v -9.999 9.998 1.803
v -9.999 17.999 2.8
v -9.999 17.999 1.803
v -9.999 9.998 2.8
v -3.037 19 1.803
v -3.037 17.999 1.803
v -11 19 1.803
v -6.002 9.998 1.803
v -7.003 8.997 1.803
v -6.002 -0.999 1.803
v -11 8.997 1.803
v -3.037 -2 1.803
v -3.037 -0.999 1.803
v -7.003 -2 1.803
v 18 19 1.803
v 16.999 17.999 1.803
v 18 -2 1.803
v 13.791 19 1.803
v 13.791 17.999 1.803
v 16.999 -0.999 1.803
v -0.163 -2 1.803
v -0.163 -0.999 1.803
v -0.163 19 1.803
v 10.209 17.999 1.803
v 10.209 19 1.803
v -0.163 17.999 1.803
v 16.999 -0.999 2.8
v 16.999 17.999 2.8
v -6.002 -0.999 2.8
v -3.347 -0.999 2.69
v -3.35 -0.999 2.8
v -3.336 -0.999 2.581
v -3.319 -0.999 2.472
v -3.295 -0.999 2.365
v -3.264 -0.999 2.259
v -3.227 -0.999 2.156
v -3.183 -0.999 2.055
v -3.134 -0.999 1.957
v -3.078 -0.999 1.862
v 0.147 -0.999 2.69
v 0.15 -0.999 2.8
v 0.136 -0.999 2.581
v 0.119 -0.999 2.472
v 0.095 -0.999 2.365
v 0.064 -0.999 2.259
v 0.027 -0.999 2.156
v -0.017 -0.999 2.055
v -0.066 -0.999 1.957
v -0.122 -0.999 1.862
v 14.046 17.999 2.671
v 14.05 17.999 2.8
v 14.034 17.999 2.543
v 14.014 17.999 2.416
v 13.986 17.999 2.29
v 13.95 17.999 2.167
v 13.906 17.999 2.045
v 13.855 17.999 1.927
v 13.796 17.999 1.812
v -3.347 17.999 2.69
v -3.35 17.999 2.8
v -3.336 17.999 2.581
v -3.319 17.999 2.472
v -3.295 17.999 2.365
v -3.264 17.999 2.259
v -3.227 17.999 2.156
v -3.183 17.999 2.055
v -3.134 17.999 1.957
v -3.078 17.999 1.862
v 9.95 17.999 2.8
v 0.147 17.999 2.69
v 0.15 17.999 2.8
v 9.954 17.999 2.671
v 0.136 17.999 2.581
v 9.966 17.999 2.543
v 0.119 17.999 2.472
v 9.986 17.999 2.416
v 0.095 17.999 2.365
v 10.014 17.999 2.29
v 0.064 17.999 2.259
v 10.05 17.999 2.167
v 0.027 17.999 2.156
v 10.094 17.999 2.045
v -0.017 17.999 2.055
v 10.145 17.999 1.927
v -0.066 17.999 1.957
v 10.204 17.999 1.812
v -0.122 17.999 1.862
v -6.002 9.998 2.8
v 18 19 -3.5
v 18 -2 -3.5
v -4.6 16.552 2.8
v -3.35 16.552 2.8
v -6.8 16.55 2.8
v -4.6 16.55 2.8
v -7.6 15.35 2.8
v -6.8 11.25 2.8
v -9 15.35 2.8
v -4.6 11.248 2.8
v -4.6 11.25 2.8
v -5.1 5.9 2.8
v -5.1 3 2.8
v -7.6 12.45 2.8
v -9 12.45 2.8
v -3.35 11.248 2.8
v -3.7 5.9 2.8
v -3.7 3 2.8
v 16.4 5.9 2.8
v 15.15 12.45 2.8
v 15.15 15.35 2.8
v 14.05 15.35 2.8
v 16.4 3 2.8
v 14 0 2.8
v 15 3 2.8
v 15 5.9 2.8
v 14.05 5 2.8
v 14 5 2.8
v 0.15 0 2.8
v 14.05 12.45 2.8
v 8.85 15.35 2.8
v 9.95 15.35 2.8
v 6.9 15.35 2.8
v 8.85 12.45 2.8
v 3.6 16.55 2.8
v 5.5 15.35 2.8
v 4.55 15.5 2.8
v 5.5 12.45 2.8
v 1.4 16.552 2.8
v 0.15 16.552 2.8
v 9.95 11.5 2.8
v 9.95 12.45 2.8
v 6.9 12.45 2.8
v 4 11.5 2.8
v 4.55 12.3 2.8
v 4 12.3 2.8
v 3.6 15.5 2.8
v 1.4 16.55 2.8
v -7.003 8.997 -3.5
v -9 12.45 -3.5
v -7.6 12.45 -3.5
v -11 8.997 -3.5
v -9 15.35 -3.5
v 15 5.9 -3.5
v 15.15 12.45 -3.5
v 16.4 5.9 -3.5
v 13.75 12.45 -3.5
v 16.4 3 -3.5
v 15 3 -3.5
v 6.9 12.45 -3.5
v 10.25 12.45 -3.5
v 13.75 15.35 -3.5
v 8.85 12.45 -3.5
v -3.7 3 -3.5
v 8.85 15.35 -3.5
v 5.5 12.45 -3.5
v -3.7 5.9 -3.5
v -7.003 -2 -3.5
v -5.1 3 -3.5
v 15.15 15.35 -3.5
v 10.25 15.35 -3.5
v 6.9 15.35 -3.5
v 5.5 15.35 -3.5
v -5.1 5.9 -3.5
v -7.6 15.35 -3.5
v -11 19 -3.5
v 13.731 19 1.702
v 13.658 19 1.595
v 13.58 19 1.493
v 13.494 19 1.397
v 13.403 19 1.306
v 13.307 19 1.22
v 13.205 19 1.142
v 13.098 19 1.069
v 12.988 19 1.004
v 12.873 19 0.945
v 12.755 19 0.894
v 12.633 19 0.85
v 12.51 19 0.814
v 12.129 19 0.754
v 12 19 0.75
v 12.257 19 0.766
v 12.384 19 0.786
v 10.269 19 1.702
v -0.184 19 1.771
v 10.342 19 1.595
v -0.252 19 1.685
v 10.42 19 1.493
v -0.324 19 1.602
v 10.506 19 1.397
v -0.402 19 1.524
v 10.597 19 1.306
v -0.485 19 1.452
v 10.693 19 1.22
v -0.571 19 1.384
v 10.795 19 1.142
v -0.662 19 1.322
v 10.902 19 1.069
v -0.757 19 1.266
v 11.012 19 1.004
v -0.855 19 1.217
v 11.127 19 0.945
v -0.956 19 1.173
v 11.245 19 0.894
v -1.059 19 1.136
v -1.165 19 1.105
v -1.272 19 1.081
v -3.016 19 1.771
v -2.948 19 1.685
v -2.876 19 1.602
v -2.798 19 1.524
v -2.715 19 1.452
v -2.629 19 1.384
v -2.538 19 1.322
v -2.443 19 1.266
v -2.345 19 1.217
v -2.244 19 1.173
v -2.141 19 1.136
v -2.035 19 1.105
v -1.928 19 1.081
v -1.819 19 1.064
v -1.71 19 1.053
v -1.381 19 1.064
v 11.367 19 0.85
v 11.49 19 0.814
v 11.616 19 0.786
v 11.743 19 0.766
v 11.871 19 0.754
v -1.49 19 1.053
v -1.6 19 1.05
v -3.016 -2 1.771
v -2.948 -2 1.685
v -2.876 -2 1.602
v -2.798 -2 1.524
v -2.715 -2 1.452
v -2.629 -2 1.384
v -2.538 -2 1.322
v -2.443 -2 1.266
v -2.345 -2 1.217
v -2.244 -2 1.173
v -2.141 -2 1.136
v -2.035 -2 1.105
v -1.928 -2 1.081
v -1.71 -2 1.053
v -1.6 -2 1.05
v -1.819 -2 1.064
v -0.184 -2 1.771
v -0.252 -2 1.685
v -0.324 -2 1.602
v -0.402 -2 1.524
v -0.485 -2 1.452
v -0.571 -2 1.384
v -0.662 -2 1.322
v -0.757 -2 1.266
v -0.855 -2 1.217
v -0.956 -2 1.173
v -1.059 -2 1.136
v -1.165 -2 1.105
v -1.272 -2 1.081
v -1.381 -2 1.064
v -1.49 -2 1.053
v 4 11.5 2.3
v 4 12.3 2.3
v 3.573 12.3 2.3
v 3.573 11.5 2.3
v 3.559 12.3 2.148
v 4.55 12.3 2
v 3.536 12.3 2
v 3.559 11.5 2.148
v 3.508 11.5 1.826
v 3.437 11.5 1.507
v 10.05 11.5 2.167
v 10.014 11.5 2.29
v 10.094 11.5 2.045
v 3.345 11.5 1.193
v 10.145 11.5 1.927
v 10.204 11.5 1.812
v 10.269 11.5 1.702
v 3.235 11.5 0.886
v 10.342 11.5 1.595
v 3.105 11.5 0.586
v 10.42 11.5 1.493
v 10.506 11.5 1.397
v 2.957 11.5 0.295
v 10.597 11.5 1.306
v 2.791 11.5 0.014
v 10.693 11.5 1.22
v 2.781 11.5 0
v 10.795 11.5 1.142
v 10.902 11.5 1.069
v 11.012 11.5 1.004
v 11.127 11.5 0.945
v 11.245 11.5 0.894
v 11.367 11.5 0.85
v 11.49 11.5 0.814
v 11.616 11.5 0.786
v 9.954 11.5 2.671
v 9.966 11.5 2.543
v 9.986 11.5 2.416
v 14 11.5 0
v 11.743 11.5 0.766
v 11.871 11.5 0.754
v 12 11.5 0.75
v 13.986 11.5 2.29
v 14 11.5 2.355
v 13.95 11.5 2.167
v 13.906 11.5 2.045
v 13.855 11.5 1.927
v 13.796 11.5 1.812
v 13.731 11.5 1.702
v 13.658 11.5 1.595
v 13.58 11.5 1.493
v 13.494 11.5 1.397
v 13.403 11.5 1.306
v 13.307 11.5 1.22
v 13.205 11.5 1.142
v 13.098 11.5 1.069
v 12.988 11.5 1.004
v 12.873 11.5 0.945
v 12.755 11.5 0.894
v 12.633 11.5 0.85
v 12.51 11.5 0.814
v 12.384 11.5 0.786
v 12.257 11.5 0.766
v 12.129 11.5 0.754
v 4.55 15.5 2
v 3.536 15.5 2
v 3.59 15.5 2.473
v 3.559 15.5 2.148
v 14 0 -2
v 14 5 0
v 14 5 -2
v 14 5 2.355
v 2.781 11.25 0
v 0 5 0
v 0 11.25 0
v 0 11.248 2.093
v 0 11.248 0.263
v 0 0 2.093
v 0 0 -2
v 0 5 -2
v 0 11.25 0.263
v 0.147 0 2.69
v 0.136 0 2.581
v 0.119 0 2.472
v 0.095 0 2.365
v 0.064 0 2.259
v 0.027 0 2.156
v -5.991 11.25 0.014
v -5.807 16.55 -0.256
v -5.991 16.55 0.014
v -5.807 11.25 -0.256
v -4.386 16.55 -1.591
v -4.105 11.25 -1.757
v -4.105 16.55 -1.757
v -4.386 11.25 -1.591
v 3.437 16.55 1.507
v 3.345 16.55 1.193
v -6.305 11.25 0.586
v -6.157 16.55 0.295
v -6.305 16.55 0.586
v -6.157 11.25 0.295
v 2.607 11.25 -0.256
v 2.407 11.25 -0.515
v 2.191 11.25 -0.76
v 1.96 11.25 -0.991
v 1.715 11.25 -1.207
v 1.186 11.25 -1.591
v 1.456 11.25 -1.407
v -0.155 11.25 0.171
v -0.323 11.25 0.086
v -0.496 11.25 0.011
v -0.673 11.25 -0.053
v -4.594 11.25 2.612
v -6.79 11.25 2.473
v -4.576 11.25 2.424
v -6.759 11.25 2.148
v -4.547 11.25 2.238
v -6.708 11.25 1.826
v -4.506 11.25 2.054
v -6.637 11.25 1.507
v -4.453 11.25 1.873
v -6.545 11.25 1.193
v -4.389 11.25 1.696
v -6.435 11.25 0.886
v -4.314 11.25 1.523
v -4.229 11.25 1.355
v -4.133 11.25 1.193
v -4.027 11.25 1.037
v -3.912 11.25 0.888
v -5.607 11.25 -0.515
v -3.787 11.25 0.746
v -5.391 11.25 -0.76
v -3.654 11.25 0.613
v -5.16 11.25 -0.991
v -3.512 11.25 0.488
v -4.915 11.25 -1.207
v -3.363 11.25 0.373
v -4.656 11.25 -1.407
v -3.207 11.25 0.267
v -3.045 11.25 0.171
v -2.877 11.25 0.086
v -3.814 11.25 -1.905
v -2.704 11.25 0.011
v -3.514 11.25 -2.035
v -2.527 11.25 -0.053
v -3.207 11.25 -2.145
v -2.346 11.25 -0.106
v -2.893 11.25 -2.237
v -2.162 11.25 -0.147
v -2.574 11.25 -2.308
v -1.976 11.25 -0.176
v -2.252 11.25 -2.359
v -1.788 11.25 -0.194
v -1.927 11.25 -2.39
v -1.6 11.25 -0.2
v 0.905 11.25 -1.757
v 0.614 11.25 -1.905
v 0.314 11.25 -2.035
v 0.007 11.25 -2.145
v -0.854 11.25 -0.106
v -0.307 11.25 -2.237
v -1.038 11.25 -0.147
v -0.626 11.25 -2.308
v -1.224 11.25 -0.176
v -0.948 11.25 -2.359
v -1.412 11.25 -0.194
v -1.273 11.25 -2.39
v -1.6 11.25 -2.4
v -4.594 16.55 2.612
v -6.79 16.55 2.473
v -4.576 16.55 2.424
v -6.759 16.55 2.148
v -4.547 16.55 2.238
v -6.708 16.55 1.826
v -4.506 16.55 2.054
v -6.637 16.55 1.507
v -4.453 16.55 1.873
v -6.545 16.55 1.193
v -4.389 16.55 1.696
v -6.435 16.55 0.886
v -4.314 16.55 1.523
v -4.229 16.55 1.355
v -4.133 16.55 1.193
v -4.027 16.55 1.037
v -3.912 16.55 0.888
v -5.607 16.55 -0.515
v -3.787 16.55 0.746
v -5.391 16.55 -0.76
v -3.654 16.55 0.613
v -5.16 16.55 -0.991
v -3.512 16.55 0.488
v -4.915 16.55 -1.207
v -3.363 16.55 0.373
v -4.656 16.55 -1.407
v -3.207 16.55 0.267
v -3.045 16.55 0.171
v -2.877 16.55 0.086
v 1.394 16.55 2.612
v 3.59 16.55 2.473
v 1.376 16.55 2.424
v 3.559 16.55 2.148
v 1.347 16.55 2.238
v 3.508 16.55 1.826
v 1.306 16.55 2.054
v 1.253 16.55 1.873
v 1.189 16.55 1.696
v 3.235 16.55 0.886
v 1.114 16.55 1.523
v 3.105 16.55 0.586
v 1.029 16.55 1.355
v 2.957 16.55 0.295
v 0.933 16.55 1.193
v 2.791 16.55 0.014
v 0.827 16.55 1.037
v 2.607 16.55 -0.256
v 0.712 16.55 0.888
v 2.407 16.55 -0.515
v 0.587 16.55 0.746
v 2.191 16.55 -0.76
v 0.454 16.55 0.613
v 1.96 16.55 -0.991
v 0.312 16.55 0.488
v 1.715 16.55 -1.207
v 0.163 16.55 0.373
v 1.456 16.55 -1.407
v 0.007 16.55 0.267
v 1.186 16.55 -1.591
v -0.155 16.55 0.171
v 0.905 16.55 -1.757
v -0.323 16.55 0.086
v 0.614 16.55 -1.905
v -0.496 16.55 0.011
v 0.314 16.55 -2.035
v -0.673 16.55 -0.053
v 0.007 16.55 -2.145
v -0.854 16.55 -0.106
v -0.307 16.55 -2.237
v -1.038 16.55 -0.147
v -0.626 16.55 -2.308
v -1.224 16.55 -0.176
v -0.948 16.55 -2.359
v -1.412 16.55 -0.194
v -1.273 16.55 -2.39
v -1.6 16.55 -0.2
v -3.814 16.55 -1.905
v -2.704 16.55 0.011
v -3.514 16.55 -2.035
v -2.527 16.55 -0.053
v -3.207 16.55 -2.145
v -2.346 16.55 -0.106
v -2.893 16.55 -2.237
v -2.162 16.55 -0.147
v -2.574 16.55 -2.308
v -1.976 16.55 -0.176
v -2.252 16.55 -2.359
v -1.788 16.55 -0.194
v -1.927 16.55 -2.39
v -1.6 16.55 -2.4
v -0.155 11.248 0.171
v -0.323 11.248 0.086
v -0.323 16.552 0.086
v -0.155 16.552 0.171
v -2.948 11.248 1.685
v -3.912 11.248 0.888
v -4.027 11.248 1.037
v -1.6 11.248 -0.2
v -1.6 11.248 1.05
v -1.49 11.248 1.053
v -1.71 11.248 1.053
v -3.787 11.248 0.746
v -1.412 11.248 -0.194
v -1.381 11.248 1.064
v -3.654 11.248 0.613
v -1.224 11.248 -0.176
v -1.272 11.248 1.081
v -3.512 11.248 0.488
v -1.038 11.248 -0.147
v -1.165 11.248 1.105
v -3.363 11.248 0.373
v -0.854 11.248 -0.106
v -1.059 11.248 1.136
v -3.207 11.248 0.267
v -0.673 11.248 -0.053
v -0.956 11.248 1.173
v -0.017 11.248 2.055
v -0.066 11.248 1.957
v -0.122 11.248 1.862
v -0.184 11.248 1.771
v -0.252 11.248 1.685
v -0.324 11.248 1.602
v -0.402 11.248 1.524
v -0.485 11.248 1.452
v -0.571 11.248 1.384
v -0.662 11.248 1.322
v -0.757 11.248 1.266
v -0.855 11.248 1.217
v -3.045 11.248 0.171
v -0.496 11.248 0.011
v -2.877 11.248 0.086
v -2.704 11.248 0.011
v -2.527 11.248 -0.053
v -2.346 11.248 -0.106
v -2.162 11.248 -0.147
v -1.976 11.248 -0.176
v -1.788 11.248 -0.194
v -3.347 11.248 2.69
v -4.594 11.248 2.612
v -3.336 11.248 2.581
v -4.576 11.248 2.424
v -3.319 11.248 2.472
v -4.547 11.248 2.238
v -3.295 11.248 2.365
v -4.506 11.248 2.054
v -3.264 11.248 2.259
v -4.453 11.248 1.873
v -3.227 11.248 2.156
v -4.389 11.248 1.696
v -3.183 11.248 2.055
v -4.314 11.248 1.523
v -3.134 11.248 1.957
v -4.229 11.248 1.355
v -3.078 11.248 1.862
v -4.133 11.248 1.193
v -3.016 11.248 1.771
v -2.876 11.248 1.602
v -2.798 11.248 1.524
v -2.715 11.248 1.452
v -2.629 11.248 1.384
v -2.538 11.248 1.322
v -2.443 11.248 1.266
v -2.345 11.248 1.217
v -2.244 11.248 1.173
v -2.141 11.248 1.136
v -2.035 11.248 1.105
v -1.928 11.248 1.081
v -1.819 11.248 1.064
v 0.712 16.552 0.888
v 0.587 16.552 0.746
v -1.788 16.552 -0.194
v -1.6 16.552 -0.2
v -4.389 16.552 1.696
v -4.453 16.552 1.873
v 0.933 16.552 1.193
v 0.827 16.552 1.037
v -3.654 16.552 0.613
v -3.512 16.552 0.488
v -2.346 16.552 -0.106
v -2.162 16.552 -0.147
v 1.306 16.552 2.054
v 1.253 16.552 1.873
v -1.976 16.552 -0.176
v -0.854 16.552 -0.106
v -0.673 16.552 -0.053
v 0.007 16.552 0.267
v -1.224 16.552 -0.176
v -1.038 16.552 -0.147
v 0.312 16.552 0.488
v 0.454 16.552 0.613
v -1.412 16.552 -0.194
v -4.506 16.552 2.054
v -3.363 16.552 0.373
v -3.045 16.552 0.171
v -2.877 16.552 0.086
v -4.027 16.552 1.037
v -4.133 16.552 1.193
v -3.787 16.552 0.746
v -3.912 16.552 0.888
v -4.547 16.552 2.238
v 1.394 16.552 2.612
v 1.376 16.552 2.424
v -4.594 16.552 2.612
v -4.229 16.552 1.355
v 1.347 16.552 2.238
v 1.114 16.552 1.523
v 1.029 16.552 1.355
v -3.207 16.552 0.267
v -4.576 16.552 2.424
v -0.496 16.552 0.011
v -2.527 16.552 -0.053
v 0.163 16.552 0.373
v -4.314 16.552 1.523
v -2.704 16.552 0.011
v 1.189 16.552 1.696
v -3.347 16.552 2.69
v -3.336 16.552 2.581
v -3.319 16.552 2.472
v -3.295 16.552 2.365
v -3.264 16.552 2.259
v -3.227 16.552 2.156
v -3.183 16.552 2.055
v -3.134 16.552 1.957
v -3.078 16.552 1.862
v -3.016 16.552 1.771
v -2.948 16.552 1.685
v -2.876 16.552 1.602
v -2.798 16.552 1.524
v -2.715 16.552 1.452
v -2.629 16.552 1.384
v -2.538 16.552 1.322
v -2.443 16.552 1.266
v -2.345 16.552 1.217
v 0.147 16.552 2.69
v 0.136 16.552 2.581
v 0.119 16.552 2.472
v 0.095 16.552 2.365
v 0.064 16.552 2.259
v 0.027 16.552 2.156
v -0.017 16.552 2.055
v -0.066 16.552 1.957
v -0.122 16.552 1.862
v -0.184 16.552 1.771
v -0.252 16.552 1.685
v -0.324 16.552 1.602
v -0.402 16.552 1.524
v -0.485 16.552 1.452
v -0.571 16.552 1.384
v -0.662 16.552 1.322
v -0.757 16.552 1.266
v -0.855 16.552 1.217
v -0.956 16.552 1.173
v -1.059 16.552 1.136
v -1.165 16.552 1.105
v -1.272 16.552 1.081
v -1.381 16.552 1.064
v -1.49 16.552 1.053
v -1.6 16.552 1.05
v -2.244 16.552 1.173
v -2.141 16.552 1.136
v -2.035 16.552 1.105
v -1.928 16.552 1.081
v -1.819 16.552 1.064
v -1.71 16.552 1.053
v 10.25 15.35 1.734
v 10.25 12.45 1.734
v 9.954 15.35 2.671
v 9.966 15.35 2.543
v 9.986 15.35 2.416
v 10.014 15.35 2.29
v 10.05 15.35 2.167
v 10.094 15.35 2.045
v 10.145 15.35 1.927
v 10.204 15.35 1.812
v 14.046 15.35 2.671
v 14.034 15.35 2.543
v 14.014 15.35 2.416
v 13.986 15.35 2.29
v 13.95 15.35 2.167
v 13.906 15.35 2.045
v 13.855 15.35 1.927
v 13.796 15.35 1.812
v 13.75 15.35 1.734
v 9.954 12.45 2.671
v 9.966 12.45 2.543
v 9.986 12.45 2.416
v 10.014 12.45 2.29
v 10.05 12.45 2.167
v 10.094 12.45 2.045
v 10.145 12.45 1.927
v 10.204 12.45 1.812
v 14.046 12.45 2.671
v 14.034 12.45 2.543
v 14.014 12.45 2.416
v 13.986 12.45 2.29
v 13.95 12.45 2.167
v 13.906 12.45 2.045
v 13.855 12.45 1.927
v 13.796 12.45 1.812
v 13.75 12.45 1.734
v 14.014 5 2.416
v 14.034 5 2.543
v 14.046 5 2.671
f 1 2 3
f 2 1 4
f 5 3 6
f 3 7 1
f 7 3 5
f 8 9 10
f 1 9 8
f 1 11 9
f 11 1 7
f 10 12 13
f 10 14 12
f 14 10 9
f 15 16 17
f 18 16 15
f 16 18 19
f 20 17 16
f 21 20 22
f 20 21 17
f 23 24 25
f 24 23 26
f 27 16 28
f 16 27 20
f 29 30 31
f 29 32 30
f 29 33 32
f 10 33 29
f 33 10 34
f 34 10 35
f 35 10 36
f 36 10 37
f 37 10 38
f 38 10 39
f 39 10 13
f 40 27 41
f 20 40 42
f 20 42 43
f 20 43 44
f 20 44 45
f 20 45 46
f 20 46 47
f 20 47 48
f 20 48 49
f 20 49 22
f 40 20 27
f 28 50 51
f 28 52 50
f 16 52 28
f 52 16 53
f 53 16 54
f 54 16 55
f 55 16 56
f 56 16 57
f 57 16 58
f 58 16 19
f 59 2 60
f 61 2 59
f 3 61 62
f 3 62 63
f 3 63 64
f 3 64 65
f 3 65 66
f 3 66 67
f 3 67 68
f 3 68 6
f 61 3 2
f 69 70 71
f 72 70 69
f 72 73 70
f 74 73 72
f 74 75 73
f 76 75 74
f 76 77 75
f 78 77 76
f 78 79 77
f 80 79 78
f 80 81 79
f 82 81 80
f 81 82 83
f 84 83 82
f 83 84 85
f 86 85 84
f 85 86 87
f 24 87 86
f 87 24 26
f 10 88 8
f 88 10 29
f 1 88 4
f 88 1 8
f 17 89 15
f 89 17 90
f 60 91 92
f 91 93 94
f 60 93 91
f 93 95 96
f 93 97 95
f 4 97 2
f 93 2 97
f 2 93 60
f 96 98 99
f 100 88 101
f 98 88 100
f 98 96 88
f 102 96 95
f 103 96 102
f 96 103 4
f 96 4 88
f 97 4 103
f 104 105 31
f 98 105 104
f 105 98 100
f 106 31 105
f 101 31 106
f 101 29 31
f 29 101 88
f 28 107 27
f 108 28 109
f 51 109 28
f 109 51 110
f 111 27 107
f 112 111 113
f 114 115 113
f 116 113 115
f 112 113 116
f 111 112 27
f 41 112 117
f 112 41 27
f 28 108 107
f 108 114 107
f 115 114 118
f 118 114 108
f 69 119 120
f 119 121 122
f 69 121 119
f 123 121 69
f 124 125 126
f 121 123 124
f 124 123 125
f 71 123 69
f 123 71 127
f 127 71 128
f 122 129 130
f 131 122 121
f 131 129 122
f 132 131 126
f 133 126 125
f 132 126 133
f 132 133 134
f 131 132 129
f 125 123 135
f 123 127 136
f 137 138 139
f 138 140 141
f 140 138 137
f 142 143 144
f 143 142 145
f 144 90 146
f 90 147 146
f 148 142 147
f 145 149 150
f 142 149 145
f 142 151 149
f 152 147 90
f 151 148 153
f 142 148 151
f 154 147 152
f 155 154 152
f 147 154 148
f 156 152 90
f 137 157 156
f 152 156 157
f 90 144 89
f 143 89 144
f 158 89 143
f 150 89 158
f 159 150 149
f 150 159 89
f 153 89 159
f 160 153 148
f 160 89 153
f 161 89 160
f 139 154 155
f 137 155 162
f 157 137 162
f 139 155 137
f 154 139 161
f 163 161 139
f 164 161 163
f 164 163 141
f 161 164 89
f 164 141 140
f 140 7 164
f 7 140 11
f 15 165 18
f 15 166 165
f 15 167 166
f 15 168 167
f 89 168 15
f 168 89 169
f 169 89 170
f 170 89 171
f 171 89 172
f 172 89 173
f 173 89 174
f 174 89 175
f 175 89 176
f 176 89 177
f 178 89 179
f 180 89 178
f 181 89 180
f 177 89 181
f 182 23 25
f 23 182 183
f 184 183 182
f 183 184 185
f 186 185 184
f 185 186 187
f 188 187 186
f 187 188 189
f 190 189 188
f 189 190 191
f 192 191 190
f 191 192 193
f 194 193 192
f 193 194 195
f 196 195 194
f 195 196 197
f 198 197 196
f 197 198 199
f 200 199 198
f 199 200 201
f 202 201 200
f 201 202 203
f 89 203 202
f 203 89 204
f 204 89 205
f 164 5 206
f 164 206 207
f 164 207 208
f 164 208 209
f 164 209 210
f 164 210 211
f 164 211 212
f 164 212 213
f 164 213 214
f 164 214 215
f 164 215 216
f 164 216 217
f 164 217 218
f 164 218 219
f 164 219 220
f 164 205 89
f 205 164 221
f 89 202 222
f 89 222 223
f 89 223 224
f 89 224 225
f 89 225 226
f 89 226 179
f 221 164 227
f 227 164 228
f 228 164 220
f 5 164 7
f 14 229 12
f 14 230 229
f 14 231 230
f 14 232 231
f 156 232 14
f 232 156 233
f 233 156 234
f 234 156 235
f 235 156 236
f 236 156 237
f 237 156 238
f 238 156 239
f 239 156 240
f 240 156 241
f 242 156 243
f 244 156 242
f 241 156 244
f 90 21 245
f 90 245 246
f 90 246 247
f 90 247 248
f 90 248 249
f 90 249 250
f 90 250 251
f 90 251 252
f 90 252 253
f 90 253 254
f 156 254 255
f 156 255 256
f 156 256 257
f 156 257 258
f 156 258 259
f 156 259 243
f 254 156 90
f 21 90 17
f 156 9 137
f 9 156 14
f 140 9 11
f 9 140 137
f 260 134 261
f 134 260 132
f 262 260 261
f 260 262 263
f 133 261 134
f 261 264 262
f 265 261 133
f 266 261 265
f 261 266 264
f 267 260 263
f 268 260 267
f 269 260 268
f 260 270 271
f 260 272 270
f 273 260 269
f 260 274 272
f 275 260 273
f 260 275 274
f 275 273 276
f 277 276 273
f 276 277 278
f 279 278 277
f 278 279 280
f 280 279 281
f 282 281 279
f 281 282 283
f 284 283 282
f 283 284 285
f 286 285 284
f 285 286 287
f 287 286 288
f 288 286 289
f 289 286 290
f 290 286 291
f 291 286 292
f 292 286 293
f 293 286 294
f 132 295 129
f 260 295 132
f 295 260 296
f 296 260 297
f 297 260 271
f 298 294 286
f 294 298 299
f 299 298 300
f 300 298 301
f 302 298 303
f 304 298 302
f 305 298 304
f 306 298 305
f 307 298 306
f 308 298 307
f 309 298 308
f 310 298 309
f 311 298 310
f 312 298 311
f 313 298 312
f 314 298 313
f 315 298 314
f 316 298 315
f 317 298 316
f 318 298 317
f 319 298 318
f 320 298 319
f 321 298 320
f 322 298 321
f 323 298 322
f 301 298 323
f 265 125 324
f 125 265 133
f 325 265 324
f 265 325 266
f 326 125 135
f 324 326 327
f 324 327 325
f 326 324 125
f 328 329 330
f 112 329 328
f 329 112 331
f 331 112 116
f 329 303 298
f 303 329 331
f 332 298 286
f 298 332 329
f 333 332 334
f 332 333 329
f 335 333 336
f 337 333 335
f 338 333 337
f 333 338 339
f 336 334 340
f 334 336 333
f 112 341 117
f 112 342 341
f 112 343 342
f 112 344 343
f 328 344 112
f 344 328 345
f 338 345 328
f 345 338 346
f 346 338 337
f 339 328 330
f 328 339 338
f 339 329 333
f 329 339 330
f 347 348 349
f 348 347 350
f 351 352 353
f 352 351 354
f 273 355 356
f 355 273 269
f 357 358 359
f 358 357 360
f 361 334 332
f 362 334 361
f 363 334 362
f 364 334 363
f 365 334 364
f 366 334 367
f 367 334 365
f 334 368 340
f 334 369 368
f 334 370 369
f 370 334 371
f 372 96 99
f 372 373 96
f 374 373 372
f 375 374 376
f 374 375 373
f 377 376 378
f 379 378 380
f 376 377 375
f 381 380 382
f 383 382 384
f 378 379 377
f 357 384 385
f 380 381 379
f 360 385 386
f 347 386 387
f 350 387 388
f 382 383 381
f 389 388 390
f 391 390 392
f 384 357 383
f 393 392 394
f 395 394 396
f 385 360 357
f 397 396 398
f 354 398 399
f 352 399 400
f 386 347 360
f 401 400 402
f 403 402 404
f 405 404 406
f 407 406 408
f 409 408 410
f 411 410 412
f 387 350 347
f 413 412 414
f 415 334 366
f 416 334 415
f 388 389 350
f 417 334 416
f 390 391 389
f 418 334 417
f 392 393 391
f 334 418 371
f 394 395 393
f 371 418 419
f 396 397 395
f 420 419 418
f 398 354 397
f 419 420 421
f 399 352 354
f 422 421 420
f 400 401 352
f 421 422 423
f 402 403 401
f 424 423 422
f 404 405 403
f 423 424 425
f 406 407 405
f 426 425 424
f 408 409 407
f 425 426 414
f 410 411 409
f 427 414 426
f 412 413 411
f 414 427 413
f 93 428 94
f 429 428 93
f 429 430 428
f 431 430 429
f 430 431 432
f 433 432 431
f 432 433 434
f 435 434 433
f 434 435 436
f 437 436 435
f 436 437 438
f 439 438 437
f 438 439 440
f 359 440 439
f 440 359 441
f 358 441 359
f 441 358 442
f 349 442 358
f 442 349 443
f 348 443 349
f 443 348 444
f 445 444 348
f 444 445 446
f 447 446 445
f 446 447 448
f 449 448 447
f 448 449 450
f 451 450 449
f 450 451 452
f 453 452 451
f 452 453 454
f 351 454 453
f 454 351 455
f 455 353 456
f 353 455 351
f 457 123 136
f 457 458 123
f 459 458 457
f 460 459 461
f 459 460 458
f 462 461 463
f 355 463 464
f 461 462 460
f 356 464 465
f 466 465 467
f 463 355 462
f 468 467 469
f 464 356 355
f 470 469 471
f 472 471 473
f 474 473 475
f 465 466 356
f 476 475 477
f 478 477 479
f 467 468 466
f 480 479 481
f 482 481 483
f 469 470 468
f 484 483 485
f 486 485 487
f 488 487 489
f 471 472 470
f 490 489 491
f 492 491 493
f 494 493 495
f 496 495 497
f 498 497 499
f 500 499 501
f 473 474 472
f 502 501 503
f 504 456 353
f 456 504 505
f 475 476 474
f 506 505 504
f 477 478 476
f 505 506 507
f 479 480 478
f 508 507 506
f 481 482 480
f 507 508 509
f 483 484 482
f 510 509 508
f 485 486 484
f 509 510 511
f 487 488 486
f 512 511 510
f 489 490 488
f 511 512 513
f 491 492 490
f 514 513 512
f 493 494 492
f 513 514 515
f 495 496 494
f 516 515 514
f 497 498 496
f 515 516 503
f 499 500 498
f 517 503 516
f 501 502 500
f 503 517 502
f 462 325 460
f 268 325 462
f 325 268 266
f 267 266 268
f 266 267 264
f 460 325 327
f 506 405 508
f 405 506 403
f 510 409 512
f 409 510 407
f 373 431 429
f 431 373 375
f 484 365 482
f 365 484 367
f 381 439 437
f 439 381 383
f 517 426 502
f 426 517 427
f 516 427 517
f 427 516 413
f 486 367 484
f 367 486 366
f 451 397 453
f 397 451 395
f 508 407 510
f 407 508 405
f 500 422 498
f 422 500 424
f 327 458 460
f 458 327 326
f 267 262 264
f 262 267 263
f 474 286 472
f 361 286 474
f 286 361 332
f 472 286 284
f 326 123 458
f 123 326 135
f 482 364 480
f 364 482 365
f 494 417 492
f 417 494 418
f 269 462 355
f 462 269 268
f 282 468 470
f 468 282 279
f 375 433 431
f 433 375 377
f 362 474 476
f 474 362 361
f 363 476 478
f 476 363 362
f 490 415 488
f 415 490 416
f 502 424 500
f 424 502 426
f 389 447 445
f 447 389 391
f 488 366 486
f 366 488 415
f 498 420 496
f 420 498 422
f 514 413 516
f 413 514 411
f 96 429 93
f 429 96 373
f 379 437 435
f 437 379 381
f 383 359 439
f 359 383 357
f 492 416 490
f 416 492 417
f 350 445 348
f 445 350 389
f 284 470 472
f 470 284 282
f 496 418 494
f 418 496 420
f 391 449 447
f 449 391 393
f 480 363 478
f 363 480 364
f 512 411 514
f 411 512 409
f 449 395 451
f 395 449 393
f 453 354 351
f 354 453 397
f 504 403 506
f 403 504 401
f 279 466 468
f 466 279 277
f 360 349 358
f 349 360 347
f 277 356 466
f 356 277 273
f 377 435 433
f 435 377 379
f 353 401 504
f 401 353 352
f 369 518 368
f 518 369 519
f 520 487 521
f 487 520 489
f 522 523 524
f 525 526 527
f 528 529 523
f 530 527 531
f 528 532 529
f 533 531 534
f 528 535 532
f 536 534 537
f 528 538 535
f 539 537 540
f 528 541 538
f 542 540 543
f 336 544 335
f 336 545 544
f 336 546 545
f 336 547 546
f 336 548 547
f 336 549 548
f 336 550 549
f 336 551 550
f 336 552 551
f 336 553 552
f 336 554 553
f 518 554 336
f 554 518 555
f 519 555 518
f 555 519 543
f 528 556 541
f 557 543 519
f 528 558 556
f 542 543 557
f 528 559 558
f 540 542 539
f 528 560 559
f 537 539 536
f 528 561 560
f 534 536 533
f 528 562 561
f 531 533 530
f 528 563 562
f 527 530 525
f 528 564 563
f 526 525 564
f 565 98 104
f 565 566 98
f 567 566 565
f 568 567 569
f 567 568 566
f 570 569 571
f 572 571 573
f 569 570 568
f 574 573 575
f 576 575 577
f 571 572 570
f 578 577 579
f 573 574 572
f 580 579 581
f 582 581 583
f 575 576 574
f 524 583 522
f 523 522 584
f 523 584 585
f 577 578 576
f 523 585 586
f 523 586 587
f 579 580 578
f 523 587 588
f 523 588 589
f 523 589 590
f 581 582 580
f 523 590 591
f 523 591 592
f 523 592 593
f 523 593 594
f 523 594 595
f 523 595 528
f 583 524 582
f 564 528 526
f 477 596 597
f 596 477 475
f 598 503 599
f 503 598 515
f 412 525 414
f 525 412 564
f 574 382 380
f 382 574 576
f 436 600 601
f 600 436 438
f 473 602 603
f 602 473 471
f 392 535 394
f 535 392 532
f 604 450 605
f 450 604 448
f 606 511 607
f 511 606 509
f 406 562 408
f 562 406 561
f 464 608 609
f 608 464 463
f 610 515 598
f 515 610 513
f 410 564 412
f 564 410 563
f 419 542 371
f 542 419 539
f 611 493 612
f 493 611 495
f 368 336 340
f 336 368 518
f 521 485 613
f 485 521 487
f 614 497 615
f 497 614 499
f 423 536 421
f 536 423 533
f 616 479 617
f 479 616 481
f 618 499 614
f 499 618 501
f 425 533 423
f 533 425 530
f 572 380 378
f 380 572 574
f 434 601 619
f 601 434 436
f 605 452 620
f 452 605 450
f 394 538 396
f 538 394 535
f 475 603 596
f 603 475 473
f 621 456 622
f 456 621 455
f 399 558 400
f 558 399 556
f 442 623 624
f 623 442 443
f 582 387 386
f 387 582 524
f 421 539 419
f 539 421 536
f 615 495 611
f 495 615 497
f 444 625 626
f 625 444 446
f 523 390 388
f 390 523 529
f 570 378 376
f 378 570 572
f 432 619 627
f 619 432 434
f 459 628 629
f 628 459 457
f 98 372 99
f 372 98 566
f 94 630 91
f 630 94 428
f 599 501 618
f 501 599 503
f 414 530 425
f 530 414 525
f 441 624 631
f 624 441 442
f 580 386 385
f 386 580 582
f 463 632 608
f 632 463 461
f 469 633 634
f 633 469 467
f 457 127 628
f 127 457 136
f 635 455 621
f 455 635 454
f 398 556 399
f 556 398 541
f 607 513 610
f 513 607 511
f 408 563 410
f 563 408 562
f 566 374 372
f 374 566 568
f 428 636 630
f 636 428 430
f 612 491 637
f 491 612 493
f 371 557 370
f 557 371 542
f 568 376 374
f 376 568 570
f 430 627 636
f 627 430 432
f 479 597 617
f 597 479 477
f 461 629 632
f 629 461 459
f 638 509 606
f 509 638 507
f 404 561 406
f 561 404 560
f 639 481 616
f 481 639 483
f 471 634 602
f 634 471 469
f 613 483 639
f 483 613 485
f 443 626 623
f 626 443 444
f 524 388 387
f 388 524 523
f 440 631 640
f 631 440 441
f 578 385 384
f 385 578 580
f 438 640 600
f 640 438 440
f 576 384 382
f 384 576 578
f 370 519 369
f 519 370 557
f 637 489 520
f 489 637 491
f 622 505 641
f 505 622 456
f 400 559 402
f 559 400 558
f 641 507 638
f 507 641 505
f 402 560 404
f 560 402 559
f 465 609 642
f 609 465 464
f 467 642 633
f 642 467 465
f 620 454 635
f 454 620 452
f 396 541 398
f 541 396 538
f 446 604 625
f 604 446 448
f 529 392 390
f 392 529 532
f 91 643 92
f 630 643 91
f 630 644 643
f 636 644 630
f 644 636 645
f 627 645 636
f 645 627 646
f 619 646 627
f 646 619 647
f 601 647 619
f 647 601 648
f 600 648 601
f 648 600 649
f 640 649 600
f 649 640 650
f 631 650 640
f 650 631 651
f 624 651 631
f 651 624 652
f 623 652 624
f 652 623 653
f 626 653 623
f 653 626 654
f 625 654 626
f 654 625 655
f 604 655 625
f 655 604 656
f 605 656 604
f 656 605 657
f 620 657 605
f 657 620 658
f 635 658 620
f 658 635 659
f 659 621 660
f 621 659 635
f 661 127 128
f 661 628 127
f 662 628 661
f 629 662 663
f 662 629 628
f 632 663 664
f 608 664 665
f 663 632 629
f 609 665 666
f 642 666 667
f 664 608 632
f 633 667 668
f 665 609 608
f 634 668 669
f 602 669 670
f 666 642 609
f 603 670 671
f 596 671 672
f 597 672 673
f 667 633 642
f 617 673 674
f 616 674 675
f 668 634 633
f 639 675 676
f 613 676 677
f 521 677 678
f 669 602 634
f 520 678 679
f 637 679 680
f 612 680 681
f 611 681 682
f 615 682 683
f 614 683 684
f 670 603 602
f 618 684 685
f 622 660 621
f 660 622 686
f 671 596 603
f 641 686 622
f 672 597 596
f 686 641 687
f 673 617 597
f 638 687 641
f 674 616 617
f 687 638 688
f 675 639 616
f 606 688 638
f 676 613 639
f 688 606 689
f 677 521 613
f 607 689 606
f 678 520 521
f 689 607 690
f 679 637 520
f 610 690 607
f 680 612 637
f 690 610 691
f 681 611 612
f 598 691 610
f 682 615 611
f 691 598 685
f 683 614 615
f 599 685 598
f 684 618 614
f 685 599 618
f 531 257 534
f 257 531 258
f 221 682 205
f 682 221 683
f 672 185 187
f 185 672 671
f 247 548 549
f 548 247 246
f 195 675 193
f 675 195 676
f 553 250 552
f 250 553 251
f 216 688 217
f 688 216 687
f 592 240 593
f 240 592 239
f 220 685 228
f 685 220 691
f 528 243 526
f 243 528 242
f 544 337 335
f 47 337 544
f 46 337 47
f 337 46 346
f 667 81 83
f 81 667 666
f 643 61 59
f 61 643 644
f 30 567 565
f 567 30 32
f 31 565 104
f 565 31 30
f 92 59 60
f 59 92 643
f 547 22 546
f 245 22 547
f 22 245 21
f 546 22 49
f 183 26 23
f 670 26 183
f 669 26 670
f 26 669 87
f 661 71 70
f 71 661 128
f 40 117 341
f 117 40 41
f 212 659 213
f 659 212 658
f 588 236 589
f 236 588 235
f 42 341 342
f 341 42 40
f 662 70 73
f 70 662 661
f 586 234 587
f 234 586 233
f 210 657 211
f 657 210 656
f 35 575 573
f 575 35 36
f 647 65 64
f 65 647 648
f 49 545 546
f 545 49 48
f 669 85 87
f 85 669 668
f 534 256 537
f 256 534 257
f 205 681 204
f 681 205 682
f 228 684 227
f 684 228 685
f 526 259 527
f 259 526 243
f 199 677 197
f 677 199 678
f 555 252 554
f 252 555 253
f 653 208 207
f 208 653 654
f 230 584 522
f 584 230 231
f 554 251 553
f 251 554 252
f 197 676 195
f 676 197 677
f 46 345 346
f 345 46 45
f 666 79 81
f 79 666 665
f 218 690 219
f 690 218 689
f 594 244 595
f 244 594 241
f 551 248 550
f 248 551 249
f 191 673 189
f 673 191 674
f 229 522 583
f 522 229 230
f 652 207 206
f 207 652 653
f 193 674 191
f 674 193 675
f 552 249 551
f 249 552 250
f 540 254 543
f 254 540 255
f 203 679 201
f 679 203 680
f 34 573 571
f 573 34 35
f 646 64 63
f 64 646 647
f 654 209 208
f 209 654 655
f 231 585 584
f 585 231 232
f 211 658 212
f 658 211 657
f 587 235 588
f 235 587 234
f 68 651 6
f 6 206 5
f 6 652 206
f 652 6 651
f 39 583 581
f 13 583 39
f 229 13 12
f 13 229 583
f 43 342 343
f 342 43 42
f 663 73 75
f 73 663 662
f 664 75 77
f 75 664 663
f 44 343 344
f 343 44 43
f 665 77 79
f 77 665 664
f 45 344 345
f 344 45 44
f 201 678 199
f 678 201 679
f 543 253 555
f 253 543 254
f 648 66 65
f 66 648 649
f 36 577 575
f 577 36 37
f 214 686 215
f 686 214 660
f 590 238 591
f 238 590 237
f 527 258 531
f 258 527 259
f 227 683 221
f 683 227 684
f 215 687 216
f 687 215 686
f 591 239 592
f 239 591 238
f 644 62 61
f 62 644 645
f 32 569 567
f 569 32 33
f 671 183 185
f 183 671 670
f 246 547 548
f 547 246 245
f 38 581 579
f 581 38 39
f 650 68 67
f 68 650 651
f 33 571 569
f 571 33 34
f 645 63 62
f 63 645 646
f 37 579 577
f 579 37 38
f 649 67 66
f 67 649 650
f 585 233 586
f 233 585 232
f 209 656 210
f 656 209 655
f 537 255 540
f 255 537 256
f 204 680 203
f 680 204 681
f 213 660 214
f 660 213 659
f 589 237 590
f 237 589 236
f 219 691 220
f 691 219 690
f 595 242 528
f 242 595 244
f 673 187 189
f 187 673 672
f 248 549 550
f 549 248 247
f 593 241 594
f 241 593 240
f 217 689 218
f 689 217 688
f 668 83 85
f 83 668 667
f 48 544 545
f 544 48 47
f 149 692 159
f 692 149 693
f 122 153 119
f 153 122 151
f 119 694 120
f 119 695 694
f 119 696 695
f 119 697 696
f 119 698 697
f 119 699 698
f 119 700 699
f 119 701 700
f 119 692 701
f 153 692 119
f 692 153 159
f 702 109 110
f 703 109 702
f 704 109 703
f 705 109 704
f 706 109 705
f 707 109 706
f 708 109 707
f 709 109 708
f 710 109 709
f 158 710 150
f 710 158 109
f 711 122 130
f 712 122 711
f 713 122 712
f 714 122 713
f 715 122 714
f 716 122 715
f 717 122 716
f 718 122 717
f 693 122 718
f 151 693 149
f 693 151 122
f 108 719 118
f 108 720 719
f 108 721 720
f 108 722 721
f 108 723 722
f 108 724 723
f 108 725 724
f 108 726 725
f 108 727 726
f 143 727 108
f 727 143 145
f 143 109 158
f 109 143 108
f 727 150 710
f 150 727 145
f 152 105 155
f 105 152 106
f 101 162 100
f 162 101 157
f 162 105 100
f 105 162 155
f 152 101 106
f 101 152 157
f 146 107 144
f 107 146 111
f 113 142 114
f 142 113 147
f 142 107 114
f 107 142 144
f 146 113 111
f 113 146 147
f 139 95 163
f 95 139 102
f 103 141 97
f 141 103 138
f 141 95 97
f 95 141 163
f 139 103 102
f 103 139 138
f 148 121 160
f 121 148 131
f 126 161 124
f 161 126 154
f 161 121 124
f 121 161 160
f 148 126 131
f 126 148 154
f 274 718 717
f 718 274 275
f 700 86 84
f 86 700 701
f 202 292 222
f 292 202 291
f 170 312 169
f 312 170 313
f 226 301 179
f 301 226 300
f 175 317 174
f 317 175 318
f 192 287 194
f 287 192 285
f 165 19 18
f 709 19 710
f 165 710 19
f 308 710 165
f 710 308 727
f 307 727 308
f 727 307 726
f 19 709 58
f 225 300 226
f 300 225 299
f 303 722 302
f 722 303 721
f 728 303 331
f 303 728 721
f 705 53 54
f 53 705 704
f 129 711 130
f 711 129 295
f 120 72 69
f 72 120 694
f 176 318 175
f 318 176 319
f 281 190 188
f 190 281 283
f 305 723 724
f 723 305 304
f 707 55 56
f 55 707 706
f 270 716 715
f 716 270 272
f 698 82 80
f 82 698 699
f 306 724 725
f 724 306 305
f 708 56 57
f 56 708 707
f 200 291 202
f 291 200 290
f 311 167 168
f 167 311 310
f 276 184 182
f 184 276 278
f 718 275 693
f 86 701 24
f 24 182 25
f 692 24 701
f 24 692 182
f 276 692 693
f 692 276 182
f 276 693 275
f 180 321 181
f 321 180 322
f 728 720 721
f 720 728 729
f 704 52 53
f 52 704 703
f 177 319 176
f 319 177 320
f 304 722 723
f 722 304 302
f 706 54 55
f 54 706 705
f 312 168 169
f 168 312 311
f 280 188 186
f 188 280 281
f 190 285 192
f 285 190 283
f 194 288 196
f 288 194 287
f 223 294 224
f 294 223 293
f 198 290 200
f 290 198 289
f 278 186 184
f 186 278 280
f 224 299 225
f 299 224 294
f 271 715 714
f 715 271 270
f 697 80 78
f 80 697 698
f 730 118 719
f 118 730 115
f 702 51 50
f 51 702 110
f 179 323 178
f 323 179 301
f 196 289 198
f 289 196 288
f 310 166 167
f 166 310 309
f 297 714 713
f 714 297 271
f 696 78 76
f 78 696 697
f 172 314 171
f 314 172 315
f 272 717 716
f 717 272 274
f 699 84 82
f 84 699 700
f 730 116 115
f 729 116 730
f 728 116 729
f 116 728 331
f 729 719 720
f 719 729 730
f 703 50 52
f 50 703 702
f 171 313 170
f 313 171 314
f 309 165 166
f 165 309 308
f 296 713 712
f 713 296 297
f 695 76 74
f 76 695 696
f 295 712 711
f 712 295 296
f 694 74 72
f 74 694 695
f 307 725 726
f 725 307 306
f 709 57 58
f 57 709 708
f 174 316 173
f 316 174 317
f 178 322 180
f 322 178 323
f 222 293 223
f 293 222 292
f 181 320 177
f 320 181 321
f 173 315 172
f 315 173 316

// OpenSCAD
$fn=100;

epsilon = 0.003;

//TODO: Check params
power_cable_dia = 3.5;
ferrite_outer_dia = 10.4;
ferrite_depth = 5.3;
ferrite_width = 2.2;

pcb_size = [14, 11.5, 5];
pcb_cable_guide_width = 5;
pcb_cable_guide_extra_height = 4;
sensor_left_offset = 1;
sensor_height_offset = 2.3;
sensor_pin_size = [3, 0.8, 0.5];
sensor_head_size = [4.1, 3.2, 1.6];
sensor_head_z_pos = -0.3;

data_cable_dia = 4.1;
data_cable_x = 12;
data_cable_y = 5;
data_cable_zip_dist = -0.3;

base_sx = 21;
base_sy = 17;

base_border = [4, 2, 3.5];
base_edge_width = 1;
base_edge_heigth = 1;
base_cutout_x = 4;
base_cutout_y = 11;

top_thickness = 6;

zip_size = [1.4, 2.9];

// Derived parameters
pcb_to_sensor_center = [0, pcb_size[1], 0] + [sensor_left_offset + sensor_pin_size[0] / 2, sensor_pin_size[1], sensor_height_offset + sensor_head_z_pos] + [0, sensor_head_size[1] / 2, sensor_head_size[2] / 2];

ferrite_center = pcb_to_sensor_center - [ferrite_outer_dia / 2 - ferrite_width / 2, 0, 0];

base_size = [base_sx + base_border[0] * 2, base_sy + base_border[1] * 2, base_border[2] + ferrite_center[2]];

module ferrite()
{
    //difference()
    {
        cylinder(h = ferrite_depth, r = ferrite_outer_dia / 2, center = true);
        cylinder(h = ferrite_depth + epsilon, r = ferrite_outer_dia / 2 - ferrite_width, center = true);
    }
}

module power_cable()
{
    cylinder(h = 100, r = power_cable_dia / 2, center = true);
}

module pcb()
{
    
    cube(pcb_size);
    
    translate([0, 0, -pcb_cable_guide_extra_height / 2])
        cube([pcb_size[0], pcb_cable_guide_width, pcb_size[2] + pcb_cable_guide_extra_height]);
    translate([sensor_left_offset, pcb_size[1], sensor_height_offset])
    {
        cube(sensor_pin_size);
        translate([(sensor_pin_size[0] - sensor_head_size[0]) / 2, sensor_pin_size[1], sensor_head_z_pos])
        {
            cube(sensor_head_size);
        }
    }
}

module data_cable()
{
    cylinder(h = 100, r = data_cable_dia / 2);
}


module base_edge()
{
    translate([-epsilon/2, -epsilon/2, base_size[2] - base_edge_heigth + epsilon])
    {
        // normal edges
        translate([0, base_cutout_y - epsilon, 0])
            cube([base_edge_width + epsilon, base_size[1] - base_cutout_y + epsilon, base_edge_heigth]);
        
        translate([base_size[0] - base_edge_width, 0, 0])
            cube([base_edge_width + epsilon, base_size[1] + epsilon, base_edge_heigth]);
        
        translate([base_cutout_x - epsilon, 0, 0])
            cube([base_size[0] - base_cutout_x + epsilon, base_edge_width + epsilon, base_edge_heigth]);
        
        translate([0, base_size[1] - base_edge_width, 0])
            cube([base_size[0] + epsilon, base_edge_width + epsilon, base_edge_heigth]);
        
        // cutout edges
        translate([base_cutout_x - epsilon, 0, 0])
            cube([base_edge_width + epsilon, base_cutout_y, base_edge_heigth]);
        
        translate([base_edge_width, base_cutout_y - epsilon, 0])
            cube([base_cutout_x, base_edge_width + epsilon, base_edge_heigth]);
    }
}


module base()
{
    translate([pcb_size[0] - base_size[0] + base_border[0],
               -base_border[1],
               -base_border[2]])
    {
        difference()
        {
            cube(base_size);
            
            translate([-epsilon, -epsilon, -epsilon/2])
                cube([base_cutout_x, base_cutout_y, base_size[2] + epsilon]);
            
            base_edge();
        }
    }
}


module top()
{
    translate([pcb_size[0] - base_size[0] + base_border[0],
               -base_border[1],
               -base_border[2] + base_size[2]])
    {
        difference()
        {
            cube([base_size[0], base_size[1], top_thickness]);
            
            translate([-epsilon, -epsilon, -epsilon/2])
                cube([base_cutout_x, base_cutout_y, top_thickness + epsilon]);
        }
    }
        
    translate([pcb_size[0] - base_size[0] + base_border[0],
           -base_border[1],
           -base_border[2]])
    {
        base_edge();
    }
}


module zip_tie()
{
    translate([0, 0, -10])
    {
        cube([zip_size[0], zip_size[1], 25]);
    }
}

module bottom_only_zip_tie()
{
    translate([0, 0, ferrite_center[2] - 10 + epsilon])
    {
        cube([zip_size[0], zip_size[1], 10]);
    }
}

module zip_ties()
{
    translate([ferrite_center[0] - power_cable_dia, 3, 0]) zip_tie();
    translate([pcb_size[0] + 1, 3, 0]) zip_tie();
    
    translate([-9, ferrite_center[1] - zip_size[1] / 2, 0]) zip_tie();
    translate([5.5, ferrite_center[1] - zip_size[1] / 2, 0]) zip_tie();
    
    
    // zip ties for the data cable
    
    translate([data_cable_x - data_cable_dia / 2 - zip_size[0], ferrite_center[1] - zip_size[1] / 2, 0])
    {
        translate([-data_cable_zip_dist, 0, 0])
        bottom_only_zip_tie();
        
        translate([data_cable_dia + data_cable_zip_dist + zip_size[0], 0, 0]) bottom_only_zip_tie();
        
        // cutout in the top part for the data cable zip tie
        translate([0, 0, ferrite_center[2] + epsilon])
        cube([data_cable_dia + zip_size[0] * 2, zip_size[1], data_cable_dia / 2 + zip_size[0] + 1]);
    }
}


module components()
{
    pcb();

    translate(ferrite_center)
    rotate([90, 0, 0])
    {
        ferrite();
        power_cable();
    }
    
    translate([data_cable_x, data_cable_y, ferrite_center[2]])
    rotate([90, 0, 180])
    {
        data_cable();
    }
    
    zip_ties();
}


difference()
{
    base();
    %top();
    #components();
}
